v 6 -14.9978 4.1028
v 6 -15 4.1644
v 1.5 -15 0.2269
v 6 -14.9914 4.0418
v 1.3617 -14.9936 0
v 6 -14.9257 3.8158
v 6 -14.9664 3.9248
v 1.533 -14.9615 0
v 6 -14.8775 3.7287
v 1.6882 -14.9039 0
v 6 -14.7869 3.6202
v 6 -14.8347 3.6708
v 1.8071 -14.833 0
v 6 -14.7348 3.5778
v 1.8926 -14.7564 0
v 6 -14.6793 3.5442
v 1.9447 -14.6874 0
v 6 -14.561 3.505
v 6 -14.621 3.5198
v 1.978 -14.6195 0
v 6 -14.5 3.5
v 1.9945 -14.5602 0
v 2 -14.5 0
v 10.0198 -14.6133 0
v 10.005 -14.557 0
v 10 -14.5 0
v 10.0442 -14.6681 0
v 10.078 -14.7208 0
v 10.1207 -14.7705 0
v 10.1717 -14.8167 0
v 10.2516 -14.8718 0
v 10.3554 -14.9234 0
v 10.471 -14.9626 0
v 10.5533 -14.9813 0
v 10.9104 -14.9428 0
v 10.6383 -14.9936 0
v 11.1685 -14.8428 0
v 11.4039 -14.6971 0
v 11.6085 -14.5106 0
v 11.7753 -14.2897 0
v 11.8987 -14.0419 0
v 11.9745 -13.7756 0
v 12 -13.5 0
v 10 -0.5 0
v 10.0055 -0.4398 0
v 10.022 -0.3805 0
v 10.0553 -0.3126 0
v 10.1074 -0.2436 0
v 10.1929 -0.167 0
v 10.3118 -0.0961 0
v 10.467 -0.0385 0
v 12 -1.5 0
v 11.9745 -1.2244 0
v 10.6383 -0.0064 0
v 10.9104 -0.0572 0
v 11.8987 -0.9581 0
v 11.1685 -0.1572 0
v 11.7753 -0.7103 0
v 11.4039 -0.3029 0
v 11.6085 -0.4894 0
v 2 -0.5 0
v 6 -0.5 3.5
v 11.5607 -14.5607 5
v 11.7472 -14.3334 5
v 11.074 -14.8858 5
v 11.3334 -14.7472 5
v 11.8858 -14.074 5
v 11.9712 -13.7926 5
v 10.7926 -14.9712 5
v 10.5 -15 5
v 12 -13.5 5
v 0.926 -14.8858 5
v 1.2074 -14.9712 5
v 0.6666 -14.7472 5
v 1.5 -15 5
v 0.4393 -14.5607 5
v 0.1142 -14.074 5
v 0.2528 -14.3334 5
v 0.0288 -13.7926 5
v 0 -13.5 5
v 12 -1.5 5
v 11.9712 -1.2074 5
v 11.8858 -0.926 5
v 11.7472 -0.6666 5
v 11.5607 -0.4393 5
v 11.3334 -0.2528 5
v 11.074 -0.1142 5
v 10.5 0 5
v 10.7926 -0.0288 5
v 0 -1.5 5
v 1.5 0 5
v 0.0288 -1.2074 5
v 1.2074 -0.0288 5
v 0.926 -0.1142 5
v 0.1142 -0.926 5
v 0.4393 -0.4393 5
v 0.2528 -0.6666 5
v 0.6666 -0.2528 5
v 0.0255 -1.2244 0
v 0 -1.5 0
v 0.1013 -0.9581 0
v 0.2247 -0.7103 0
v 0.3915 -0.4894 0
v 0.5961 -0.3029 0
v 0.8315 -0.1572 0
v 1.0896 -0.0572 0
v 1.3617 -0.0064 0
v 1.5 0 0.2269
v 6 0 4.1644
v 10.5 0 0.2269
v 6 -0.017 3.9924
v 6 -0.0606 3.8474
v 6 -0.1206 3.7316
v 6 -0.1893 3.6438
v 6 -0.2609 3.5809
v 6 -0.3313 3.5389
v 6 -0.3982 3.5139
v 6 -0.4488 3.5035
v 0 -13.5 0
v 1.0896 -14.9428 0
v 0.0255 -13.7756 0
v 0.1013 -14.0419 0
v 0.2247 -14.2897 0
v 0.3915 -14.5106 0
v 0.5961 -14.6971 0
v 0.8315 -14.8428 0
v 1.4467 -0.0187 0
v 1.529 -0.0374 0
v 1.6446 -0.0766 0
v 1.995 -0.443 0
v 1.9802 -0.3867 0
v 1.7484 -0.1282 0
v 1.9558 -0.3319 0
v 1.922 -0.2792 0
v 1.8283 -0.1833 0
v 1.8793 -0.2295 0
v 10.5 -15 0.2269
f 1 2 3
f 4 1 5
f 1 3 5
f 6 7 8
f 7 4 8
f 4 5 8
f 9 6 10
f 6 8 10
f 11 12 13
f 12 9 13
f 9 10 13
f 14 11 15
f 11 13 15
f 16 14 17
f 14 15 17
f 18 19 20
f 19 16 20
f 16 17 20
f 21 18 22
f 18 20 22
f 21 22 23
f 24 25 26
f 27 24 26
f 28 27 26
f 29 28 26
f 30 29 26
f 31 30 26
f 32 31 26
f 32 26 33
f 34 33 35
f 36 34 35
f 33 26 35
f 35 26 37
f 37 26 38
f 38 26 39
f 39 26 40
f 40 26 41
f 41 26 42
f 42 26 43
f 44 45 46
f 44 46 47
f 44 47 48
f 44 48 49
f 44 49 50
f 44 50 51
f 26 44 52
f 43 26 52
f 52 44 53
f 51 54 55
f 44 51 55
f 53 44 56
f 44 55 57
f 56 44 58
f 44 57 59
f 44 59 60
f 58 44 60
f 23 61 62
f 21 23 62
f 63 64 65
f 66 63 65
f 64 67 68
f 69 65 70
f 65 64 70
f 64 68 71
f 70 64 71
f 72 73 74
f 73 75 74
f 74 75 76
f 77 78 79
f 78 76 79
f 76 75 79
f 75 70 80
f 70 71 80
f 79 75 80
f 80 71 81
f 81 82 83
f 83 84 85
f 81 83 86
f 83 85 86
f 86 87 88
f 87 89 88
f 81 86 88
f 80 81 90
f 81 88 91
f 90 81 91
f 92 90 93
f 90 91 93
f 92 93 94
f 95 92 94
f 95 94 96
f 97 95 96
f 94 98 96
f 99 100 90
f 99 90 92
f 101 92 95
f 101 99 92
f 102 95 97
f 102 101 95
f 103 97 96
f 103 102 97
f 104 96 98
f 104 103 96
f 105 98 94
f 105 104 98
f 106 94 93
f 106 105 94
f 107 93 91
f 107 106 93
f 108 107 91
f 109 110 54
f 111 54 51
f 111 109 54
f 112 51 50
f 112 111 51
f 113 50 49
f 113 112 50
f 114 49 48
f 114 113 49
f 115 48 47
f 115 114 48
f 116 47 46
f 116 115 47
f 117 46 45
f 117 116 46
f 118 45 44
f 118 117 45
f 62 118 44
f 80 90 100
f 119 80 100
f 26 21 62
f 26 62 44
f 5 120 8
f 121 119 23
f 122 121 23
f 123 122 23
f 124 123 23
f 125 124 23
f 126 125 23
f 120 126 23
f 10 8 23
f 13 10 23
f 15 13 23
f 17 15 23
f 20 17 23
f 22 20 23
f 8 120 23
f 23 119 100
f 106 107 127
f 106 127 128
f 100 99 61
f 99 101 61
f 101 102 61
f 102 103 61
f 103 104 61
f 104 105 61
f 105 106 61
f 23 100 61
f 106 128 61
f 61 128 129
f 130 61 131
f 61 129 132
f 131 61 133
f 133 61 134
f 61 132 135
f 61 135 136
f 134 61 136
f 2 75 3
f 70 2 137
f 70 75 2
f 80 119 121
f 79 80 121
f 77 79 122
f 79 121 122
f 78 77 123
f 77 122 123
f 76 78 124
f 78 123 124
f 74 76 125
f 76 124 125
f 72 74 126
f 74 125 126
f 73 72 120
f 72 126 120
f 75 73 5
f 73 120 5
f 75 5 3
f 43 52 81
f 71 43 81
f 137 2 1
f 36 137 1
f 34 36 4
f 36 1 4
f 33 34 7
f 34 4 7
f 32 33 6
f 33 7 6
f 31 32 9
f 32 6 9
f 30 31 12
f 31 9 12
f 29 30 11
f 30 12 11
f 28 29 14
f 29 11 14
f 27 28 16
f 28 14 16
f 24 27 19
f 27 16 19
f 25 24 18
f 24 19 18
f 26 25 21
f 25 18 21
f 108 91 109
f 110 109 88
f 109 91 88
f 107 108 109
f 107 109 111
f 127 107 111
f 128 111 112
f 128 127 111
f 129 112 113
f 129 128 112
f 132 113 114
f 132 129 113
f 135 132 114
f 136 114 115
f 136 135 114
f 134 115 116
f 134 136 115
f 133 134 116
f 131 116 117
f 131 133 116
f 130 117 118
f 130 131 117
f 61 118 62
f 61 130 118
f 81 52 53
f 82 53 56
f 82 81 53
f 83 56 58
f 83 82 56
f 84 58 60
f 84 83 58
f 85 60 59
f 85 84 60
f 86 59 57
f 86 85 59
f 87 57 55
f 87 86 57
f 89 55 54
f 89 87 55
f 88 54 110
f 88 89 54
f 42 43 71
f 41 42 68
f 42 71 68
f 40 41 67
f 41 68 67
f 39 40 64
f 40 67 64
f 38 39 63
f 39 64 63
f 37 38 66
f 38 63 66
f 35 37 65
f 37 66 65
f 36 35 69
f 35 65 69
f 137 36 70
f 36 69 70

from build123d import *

# Parameters (mm, degrees)
F1_DEPTH     = 15
F2_R         = 1.5
F3_T4_DEPTH  = 7.8150729064
F3_T9_DEPTH  = 7.8150729064
F3_T14_DEPTH = 7.8150729064
F3_T19_DEPTH = 7.8150729064
F3_T25_DEPTH = 7.8150729064
F3_T29_DEPTH = 7.8150729064
F3_T36_DEPTH = 7.8150729064
F3_T40_DEPTH = 7.8150729064


# Not quite as in the source:
# - a fillet or chamfer that OpenCascade refuses, or shapes differently, is made with other operations: its cross-section is extruded or revolved along the edge and cut away or added


with BuildPart() as f1:
    # F0 (on Front) → F1 (new body)
    with BuildSketch(Plane.XZ):
        Polygon((0, 5), (0, 0), (2, 0), (6, 3.5), (10, 0), (12, 0), (12, 5), align=None)
    extrude(amount=F1_DEPTH)

    # F2
    f2_edges = [f1.edges().sort_by_distance(p)[0] for p in [
        (0, -15, 2.5),
        (12, -15, 2.5),
        (12, 0, 2.5),
        (0, 0, 2.5),
    ]]
    fillet(f2_edges, radius=F2_R)

    # F3: fillet of radius 0.5 on 4 edges, made by hand


with BuildPart() as f3_tool2:
    # F3_s3 → F3_t4 (new body)
    with BuildSketch(Plane(origin=(0.1920224944, 0, 0.1680196826), x_dir=(0, 1, 0), z_dir=(0.7525766947, 0, 0.6585046079))):
        with BuildLine():
            ThreePointArc((-15, -0.8170092157), (-14.8535533906, -1.1705626063), (-14.5, -1.3170092157))
            Line((-14.5, -1.3170092157), (-15, -1.3170092157))
            Line((-15, -1.3170092157), (-15, -0.8170092157))
        make_face()
    extrude(amount=F3_T4_DEPTH)

    split(bisect_by=Plane(origin=(4.3362831858, 0, 4.9557522124), x_dir=(0, 1, 0), z_dir=(-0.6585046079, 0, -0.7525766947)), keep=Keep.TOP)


with BuildPart() as f1_1:
    add(f1.part)

    # F3_t1: cut F3_tool2
    add(f3_tool2.part, mode=Mode.SUBTRACT)


with BuildPart() as f3_tool7:
    # F3_s8 → F3_t9 (new body)
    with BuildSketch(Plane(origin=(0.7229959458, 0, -0.6326214526), x_dir=(0, 1, 0), z_dir=(0.7525766947, 0, -0.6585046079))):
        with BuildLine():
            ThreePointArc((-15, 7.0850460787), (-14.8535533906, 6.7314926881), (-14.5, 6.5850460787))
            Line((-14.5, 6.5850460787), (-15, 6.5850460787))
            Line((-15, 6.5850460787), (-15, 7.0850460787))
        make_face()
    extrude(amount=F3_T9_DEPTH)

    split(bisect_by=Plane(origin=(0.8672566372, 0, -0.9911504425), x_dir=(0, 1, 0), z_dir=(0.6585046079, 0, -0.7525766947)), keep=Keep.TOP)


with BuildPart() as f1_2:
    add(f1_1.part)

    # F3_t6: cut F3_tool7
    add(f3_tool7.part, mode=Mode.SUBTRACT)


with BuildPart() as f3_tool12:
    # F3_s13 → F3_t14 (new body)
    with BuildSketch(Plane(origin=(0.1920224944, 0, 0.1680196826), x_dir=(0, 1, 0), z_dir=(0.7525766947, 0, 0.6585046079))):
        with BuildLine():
            ThreePointArc((0, -0.8170092157), (-0.1464466094, -1.1705626063), (-0.5, -1.3170092157))
            Line((-0.5, -1.3170092157), (0, -1.3170092157))
            Line((0, -1.3170092157), (0, -0.8170092157))
        make_face()
    extrude(amount=F3_T14_DEPTH)

    split(bisect_by=Plane(origin=(4.3362831858, 0, 4.9557522124), x_dir=(0, 1, 0), z_dir=(-0.6585046079, 0, -0.7525766947)), keep=Keep.TOP)


with BuildPart() as f1_3:
    add(f1_2.part)

    # F3_t11: cut F3_tool12
    add(f3_tool12.part, mode=Mode.SUBTRACT)


with BuildPart() as f3_tool17:
    # F3_s18 → F3_t19 (new body)
    with BuildSketch(Plane(origin=(0.7229959458, 0, -0.6326214526), x_dir=(0, 1, 0), z_dir=(0.7525766947, 0, -0.6585046079))):
        with BuildLine():
            ThreePointArc((0, 7.0850460787), (-0.1464466094, 6.7314926881), (-0.5, 6.5850460787))
            Line((-0.5, 6.5850460787), (0, 6.5850460787))
            Line((0, 6.5850460787), (0, 7.0850460787))
        make_face()
    extrude(amount=F3_T19_DEPTH)

    split(bisect_by=Plane(origin=(0.8672566372, 0, -0.9911504425), x_dir=(0, 1, 0), z_dir=(0.6585046079, 0, -0.7525766947)), keep=Keep.TOP)


with BuildPart() as f1_4:
    add(f1_3.part)

    # F3_t16: cut F3_tool17
    add(f3_tool17.part, mode=Mode.SUBTRACT)


with BuildPart() as f3_tool23:
    # F3_s24 → F3_t25 (new body)
    with BuildSketch(Plane(origin=(0.1920224944, 0, 0.1680196826), x_dir=(0, 1, 0), z_dir=(0.7525766947, 0, 0.6585046079))):
        with BuildLine():
            ThreePointArc((-15, -0.8170092157), (-14.8535533906, -1.1705626063), (-14.5, -1.3170092157))
            Line((-14.5, -1.3170092157), (-15, -1.3170092157))
            Line((-15, -1.3170092157), (-15, -0.8170092157))
        make_face()
    extrude(amount=F3_T25_DEPTH)

    split(bisect_by=Plane(origin=(4.3362831858, 0, 4.9557522124), x_dir=(0, 1, 0), z_dir=(0.6585046079, 0, 0.7525766947)), keep=Keep.TOP)


with BuildPart() as f3_tool27:
    # F3_s28 → F3_t29 (new body)
    with BuildSketch(Plane(origin=(0.7229959458, 0, -0.6326214526), x_dir=(0, 1, 0), z_dir=(0.7525766947, 0, -0.6585046079))):
        with BuildLine():
            ThreePointArc((-15, 7.0850460787), (-14.8535533906, 6.7314926881), (-14.5, 6.5850460787))
            Line((-14.5, 6.5850460787), (-15, 6.5850460787))
            Line((-15, 6.5850460787), (-15, 7.0850460787))
        make_face()
    extrude(amount=F3_T29_DEPTH)

    split(bisect_by=Plane(origin=(0.8672566372, 0, -0.9911504425), x_dir=(0, 1, 0), z_dir=(-0.6585046079, 0, 0.7525766947)), keep=Keep.TOP)


with BuildPart() as f3_tool23_1:
    add(f3_tool23.part)

    # F3_t31: intersect F3_tool27
    add(f3_tool27.part, mode=Mode.INTERSECT)


with BuildPart() as f1_5:
    add(f1_4.part)

    # F3_t21: cut F3_tool23
    add(f3_tool23_1.part, mode=Mode.SUBTRACT)


with BuildPart() as f3_tool34:
    # F3_s35 → F3_t36 (new body)
    with BuildSketch(Plane(origin=(0.1920224944, 0, 0.1680196826), x_dir=(0, 1, 0), z_dir=(0.7525766947, 0, 0.6585046079))):
        with BuildLine():
            ThreePointArc((0, -0.8170092157), (-0.1464466094, -1.1705626063), (-0.5, -1.3170092157))
            Line((-0.5, -1.3170092157), (0, -1.3170092157))
            Line((0, -1.3170092157), (0, -0.8170092157))
        make_face()
    extrude(amount=F3_T36_DEPTH)

    split(bisect_by=Plane(origin=(4.3362831858, 0, 4.9557522124), x_dir=(0, 1, 0), z_dir=(0.6585046079, 0, 0.7525766947)), keep=Keep.TOP)


with BuildPart() as f3_tool38:
    # F3_s39 → F3_t40 (new body)
    with BuildSketch(Plane(origin=(0.7229959458, 0, -0.6326214526), x_dir=(0, 1, 0), z_dir=(0.7525766947, 0, -0.6585046079))):
        with BuildLine():
            ThreePointArc((0, 7.0850460787), (-0.1464466094, 6.7314926881), (-0.5, 6.5850460787))
            Line((-0.5, 6.5850460787), (0, 6.5850460787))
            Line((0, 6.5850460787), (0, 7.0850460787))
        make_face()
    extrude(amount=F3_T40_DEPTH)

    split(bisect_by=Plane(origin=(0.8672566372, 0, -0.9911504425), x_dir=(0, 1, 0), z_dir=(-0.6585046079, 0, 0.7525766947)), keep=Keep.TOP)


with BuildPart() as f3_tool34_1:
    add(f3_tool34.part)

    # F3_t42: intersect F3_tool38
    add(f3_tool38.part, mode=Mode.INTERSECT)


with BuildPart() as f1_6:
    add(f1_5.part)

    # F3_t32: cut F3_tool34
    add(f3_tool34_1.part, mode=Mode.SUBTRACT)


solid = f1_6.part
